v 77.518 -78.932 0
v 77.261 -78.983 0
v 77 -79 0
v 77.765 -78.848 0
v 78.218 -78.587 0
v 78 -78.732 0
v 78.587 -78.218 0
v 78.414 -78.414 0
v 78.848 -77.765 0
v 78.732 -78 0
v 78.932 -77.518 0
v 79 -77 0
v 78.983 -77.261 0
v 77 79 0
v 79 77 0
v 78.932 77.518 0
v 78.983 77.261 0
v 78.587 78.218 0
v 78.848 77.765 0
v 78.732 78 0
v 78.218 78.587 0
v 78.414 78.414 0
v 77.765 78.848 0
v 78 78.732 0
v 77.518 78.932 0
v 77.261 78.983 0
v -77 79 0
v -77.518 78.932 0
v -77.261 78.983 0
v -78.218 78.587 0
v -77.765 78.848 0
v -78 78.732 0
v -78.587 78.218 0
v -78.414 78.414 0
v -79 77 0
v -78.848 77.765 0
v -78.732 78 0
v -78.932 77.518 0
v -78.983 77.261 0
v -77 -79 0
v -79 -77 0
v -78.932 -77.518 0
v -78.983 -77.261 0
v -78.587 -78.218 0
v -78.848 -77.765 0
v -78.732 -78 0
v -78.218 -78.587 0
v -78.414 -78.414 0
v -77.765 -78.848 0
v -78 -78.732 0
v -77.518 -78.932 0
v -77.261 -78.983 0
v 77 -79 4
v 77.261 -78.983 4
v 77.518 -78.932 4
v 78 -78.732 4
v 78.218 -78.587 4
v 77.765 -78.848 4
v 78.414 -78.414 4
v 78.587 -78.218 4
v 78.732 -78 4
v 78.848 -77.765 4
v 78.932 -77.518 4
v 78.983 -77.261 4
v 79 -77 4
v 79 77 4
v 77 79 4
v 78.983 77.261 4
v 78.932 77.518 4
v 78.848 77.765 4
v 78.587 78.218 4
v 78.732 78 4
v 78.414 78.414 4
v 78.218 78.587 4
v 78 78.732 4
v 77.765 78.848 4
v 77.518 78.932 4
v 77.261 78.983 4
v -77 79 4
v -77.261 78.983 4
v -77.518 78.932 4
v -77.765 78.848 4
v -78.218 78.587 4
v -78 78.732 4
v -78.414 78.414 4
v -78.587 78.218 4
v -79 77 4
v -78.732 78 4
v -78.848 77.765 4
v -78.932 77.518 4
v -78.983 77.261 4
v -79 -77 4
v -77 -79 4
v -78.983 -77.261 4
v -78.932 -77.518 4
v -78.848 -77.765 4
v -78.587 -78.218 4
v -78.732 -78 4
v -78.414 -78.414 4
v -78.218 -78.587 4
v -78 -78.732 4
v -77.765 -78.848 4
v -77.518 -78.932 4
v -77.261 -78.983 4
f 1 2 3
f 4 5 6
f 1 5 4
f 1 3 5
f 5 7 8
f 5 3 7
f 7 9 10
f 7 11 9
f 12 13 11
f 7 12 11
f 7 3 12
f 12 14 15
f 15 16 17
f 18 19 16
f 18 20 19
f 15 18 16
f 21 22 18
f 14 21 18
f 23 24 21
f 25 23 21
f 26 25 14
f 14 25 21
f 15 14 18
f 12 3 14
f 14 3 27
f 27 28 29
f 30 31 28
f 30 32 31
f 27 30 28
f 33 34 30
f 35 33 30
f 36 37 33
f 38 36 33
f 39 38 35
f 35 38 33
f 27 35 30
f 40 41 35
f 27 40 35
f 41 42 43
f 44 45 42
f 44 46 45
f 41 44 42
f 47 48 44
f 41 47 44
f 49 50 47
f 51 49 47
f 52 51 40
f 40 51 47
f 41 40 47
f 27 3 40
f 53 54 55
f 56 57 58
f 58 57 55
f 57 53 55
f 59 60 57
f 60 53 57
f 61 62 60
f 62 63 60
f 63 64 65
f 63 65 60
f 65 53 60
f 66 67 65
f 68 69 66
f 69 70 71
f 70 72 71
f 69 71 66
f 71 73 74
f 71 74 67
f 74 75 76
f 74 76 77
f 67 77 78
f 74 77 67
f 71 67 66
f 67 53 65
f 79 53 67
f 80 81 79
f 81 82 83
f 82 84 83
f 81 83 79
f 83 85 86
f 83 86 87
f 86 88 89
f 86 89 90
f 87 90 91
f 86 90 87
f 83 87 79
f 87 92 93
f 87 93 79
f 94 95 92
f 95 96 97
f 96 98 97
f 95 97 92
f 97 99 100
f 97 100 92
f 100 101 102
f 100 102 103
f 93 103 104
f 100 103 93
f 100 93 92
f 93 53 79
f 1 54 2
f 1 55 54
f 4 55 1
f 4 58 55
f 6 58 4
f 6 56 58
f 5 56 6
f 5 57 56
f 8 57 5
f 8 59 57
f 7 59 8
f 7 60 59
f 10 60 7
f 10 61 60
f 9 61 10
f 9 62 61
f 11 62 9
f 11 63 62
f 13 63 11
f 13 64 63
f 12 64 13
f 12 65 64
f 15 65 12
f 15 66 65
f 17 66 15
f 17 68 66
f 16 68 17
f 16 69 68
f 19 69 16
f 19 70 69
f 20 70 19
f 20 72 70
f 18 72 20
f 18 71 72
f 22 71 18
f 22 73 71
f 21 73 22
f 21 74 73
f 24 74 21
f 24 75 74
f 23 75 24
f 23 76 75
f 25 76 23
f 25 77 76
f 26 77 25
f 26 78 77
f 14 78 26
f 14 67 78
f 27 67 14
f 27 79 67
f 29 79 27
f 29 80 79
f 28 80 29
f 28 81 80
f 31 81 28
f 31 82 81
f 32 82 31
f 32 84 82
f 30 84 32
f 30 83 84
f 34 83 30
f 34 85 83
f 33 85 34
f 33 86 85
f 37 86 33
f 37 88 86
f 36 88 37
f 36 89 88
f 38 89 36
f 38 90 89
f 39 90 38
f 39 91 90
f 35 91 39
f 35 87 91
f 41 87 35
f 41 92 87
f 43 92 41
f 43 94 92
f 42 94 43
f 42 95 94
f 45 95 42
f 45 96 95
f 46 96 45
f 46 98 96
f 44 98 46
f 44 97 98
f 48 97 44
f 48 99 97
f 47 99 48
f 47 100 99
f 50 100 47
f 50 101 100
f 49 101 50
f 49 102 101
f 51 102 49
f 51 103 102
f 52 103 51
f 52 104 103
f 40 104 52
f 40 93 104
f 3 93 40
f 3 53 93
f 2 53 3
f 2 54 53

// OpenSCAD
// Antarctic Gaming Co. prototype-only FDM board base, units millimetres.
// Print four copies (2x2 square). Apply the source-native board artwork as a flat laminate.
// This CAD does not replace exact game topology or approved sculpt designs.
side = 158;
thickness = 4;
$fn = 48;
linear_extrude(height = thickness)
  offset(r = 2) offset(delta = -2) square([side,side], center = true);
